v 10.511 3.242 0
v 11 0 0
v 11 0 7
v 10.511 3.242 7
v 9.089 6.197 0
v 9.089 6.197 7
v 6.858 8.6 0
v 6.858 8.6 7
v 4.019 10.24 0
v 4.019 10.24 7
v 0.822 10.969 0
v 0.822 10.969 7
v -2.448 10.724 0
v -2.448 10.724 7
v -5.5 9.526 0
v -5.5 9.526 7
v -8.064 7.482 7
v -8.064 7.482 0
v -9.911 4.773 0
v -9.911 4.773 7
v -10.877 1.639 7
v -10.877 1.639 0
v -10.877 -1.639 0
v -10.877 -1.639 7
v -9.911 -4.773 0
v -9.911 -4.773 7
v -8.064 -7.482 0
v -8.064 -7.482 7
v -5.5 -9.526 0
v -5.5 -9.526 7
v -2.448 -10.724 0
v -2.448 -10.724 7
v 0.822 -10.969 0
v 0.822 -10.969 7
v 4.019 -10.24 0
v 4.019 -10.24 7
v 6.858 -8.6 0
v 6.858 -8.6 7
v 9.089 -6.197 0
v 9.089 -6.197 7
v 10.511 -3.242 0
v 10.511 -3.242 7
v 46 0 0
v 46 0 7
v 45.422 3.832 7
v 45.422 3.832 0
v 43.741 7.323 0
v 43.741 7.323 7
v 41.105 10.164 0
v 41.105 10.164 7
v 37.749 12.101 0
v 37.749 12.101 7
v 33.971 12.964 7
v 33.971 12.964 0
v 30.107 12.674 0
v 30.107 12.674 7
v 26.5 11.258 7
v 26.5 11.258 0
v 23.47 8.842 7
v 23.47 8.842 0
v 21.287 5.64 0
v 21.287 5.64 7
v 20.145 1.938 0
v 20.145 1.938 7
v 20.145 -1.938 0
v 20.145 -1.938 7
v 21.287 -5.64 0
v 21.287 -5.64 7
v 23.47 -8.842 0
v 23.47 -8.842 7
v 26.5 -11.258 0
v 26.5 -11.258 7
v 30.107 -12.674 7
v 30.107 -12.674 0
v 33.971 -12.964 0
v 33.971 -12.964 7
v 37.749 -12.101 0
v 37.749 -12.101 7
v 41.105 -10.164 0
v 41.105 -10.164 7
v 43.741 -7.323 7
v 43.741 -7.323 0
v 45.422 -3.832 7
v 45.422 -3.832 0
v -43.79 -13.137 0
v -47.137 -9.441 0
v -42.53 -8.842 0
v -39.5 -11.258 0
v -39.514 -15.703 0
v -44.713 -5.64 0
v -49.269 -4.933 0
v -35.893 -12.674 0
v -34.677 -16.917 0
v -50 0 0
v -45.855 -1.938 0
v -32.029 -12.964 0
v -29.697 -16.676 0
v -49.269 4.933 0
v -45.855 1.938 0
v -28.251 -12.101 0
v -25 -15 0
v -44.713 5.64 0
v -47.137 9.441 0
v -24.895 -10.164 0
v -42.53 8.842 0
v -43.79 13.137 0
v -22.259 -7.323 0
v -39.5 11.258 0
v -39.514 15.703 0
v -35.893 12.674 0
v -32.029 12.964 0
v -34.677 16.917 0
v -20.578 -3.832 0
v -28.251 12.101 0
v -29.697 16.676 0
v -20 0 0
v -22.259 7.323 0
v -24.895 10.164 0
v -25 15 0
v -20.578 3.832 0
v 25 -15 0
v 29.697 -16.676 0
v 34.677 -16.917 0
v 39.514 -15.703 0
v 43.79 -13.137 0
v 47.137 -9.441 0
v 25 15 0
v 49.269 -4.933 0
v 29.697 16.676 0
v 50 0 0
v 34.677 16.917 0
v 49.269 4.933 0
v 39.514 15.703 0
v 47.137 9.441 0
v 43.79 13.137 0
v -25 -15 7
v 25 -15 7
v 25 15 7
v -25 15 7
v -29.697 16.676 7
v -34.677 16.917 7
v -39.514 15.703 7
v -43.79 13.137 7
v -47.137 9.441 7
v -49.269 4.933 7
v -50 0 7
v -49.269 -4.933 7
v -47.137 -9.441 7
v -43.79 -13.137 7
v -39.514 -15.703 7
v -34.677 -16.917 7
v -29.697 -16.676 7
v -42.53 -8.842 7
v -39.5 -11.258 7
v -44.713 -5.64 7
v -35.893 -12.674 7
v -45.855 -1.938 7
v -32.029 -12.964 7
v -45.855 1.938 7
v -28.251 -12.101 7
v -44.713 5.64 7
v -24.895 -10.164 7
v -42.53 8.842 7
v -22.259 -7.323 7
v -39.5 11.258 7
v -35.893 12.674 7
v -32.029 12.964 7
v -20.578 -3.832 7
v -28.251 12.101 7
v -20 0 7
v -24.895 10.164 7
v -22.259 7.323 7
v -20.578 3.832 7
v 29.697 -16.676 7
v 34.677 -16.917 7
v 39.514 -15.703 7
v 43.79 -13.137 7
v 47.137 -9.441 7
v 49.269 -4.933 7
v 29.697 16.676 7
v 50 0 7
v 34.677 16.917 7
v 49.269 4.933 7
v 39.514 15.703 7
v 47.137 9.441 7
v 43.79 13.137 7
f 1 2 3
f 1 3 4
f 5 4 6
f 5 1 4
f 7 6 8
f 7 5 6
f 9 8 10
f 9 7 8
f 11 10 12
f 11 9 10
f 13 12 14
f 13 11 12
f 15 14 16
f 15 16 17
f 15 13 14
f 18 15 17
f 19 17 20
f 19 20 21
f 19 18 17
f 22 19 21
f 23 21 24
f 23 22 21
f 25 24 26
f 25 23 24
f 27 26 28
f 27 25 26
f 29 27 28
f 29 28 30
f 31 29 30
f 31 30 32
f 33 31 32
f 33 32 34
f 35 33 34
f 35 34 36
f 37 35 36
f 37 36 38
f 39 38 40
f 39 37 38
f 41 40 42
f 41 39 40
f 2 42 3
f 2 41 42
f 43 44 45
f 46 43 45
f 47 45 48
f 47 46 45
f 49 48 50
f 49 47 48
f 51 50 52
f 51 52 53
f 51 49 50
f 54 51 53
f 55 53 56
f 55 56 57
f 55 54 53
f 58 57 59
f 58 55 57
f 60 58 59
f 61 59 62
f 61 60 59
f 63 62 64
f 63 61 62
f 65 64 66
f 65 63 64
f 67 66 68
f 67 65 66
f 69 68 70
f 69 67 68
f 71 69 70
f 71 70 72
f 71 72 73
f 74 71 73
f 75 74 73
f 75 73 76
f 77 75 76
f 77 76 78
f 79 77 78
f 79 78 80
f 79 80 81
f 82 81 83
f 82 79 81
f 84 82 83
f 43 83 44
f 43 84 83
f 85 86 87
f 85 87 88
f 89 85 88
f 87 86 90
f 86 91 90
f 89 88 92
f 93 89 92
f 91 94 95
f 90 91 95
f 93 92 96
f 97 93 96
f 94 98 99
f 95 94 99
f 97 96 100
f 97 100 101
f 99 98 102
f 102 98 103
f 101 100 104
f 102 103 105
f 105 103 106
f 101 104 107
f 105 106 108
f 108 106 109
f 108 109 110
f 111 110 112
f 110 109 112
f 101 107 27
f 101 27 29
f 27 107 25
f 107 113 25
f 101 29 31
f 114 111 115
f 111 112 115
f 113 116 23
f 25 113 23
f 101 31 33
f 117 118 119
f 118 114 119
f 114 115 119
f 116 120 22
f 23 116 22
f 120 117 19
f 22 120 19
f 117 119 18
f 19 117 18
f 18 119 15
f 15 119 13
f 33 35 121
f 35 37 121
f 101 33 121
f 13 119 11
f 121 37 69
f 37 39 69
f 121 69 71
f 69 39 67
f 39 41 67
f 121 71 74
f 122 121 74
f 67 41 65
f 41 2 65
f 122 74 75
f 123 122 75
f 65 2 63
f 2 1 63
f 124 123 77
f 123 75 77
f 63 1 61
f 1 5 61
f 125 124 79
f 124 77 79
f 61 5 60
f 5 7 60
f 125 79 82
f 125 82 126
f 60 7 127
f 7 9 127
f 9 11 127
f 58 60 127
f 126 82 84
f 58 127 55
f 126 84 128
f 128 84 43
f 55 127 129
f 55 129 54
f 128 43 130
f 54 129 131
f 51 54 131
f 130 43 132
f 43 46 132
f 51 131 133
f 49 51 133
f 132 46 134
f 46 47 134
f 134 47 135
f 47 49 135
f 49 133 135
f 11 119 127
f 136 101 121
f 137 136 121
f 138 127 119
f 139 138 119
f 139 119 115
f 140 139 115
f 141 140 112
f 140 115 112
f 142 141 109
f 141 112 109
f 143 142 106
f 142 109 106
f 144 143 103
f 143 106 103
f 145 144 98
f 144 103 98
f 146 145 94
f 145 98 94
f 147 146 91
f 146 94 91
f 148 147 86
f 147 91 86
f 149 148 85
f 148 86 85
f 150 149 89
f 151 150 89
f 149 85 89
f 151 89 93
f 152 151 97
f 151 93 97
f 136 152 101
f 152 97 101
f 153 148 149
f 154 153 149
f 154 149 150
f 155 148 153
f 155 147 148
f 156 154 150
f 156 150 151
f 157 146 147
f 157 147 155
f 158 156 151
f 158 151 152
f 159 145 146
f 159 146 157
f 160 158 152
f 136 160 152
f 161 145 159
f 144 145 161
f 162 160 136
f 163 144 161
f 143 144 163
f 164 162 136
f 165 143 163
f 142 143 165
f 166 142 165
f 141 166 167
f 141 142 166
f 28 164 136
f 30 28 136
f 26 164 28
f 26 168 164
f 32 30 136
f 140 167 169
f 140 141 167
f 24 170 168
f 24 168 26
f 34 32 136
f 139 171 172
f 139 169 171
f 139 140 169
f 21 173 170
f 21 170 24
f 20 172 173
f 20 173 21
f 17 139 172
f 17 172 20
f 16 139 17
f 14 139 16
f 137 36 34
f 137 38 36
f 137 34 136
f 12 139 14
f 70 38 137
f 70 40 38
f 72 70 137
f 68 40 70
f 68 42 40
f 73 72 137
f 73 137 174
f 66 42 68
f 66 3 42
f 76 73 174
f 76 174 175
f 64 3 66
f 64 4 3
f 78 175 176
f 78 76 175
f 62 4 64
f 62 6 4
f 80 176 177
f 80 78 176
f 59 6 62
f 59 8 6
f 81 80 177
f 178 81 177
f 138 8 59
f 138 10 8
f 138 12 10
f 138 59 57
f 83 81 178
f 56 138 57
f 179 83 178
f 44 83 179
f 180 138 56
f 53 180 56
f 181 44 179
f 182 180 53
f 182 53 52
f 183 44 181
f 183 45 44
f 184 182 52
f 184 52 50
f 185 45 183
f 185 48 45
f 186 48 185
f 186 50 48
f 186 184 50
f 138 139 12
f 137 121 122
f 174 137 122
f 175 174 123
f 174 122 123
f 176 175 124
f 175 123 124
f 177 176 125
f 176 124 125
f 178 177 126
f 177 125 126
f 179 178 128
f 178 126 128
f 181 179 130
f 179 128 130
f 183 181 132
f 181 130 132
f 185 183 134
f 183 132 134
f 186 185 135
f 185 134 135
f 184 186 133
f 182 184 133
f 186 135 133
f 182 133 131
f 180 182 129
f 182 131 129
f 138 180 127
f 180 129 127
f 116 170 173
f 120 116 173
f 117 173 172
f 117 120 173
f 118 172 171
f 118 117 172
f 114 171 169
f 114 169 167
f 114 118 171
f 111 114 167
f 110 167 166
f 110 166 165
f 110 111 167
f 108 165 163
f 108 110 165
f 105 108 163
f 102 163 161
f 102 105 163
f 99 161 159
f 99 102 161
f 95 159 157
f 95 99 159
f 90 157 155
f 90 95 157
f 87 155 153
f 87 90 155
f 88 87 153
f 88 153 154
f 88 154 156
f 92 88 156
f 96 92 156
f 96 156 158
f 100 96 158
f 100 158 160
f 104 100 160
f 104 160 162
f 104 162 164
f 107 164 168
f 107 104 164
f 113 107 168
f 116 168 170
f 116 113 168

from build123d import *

# Parameters (mm, degrees)
F0_R     = 13
F0_R_2   = 11
F1_DEPTH = 7


with BuildPart() as f1:
    # F0 (on Top) → F1 (new body)
    with BuildSketch(Plane.XY):
        with BuildLine():
            Line((25, 15), (-25, 15))
            ThreePointArc((-25, 15), (-50, 0), (-25, -15))
            Line((-25, -15), (0, -15))
            Line((0, -15), (25, -15))
            ThreePointArc((25, -15), (50, 0), (25, 15))
        make_face()
        with Locations((-33, 0)):
            Circle(F0_R, mode=Mode.SUBTRACT)
        Circle(F0_R_2, mode=Mode.SUBTRACT)
        with Locations((33, 0)):
            Circle(F0_R, mode=Mode.SUBTRACT)
    extrude(amount=F1_DEPTH)


solid = f1.part
